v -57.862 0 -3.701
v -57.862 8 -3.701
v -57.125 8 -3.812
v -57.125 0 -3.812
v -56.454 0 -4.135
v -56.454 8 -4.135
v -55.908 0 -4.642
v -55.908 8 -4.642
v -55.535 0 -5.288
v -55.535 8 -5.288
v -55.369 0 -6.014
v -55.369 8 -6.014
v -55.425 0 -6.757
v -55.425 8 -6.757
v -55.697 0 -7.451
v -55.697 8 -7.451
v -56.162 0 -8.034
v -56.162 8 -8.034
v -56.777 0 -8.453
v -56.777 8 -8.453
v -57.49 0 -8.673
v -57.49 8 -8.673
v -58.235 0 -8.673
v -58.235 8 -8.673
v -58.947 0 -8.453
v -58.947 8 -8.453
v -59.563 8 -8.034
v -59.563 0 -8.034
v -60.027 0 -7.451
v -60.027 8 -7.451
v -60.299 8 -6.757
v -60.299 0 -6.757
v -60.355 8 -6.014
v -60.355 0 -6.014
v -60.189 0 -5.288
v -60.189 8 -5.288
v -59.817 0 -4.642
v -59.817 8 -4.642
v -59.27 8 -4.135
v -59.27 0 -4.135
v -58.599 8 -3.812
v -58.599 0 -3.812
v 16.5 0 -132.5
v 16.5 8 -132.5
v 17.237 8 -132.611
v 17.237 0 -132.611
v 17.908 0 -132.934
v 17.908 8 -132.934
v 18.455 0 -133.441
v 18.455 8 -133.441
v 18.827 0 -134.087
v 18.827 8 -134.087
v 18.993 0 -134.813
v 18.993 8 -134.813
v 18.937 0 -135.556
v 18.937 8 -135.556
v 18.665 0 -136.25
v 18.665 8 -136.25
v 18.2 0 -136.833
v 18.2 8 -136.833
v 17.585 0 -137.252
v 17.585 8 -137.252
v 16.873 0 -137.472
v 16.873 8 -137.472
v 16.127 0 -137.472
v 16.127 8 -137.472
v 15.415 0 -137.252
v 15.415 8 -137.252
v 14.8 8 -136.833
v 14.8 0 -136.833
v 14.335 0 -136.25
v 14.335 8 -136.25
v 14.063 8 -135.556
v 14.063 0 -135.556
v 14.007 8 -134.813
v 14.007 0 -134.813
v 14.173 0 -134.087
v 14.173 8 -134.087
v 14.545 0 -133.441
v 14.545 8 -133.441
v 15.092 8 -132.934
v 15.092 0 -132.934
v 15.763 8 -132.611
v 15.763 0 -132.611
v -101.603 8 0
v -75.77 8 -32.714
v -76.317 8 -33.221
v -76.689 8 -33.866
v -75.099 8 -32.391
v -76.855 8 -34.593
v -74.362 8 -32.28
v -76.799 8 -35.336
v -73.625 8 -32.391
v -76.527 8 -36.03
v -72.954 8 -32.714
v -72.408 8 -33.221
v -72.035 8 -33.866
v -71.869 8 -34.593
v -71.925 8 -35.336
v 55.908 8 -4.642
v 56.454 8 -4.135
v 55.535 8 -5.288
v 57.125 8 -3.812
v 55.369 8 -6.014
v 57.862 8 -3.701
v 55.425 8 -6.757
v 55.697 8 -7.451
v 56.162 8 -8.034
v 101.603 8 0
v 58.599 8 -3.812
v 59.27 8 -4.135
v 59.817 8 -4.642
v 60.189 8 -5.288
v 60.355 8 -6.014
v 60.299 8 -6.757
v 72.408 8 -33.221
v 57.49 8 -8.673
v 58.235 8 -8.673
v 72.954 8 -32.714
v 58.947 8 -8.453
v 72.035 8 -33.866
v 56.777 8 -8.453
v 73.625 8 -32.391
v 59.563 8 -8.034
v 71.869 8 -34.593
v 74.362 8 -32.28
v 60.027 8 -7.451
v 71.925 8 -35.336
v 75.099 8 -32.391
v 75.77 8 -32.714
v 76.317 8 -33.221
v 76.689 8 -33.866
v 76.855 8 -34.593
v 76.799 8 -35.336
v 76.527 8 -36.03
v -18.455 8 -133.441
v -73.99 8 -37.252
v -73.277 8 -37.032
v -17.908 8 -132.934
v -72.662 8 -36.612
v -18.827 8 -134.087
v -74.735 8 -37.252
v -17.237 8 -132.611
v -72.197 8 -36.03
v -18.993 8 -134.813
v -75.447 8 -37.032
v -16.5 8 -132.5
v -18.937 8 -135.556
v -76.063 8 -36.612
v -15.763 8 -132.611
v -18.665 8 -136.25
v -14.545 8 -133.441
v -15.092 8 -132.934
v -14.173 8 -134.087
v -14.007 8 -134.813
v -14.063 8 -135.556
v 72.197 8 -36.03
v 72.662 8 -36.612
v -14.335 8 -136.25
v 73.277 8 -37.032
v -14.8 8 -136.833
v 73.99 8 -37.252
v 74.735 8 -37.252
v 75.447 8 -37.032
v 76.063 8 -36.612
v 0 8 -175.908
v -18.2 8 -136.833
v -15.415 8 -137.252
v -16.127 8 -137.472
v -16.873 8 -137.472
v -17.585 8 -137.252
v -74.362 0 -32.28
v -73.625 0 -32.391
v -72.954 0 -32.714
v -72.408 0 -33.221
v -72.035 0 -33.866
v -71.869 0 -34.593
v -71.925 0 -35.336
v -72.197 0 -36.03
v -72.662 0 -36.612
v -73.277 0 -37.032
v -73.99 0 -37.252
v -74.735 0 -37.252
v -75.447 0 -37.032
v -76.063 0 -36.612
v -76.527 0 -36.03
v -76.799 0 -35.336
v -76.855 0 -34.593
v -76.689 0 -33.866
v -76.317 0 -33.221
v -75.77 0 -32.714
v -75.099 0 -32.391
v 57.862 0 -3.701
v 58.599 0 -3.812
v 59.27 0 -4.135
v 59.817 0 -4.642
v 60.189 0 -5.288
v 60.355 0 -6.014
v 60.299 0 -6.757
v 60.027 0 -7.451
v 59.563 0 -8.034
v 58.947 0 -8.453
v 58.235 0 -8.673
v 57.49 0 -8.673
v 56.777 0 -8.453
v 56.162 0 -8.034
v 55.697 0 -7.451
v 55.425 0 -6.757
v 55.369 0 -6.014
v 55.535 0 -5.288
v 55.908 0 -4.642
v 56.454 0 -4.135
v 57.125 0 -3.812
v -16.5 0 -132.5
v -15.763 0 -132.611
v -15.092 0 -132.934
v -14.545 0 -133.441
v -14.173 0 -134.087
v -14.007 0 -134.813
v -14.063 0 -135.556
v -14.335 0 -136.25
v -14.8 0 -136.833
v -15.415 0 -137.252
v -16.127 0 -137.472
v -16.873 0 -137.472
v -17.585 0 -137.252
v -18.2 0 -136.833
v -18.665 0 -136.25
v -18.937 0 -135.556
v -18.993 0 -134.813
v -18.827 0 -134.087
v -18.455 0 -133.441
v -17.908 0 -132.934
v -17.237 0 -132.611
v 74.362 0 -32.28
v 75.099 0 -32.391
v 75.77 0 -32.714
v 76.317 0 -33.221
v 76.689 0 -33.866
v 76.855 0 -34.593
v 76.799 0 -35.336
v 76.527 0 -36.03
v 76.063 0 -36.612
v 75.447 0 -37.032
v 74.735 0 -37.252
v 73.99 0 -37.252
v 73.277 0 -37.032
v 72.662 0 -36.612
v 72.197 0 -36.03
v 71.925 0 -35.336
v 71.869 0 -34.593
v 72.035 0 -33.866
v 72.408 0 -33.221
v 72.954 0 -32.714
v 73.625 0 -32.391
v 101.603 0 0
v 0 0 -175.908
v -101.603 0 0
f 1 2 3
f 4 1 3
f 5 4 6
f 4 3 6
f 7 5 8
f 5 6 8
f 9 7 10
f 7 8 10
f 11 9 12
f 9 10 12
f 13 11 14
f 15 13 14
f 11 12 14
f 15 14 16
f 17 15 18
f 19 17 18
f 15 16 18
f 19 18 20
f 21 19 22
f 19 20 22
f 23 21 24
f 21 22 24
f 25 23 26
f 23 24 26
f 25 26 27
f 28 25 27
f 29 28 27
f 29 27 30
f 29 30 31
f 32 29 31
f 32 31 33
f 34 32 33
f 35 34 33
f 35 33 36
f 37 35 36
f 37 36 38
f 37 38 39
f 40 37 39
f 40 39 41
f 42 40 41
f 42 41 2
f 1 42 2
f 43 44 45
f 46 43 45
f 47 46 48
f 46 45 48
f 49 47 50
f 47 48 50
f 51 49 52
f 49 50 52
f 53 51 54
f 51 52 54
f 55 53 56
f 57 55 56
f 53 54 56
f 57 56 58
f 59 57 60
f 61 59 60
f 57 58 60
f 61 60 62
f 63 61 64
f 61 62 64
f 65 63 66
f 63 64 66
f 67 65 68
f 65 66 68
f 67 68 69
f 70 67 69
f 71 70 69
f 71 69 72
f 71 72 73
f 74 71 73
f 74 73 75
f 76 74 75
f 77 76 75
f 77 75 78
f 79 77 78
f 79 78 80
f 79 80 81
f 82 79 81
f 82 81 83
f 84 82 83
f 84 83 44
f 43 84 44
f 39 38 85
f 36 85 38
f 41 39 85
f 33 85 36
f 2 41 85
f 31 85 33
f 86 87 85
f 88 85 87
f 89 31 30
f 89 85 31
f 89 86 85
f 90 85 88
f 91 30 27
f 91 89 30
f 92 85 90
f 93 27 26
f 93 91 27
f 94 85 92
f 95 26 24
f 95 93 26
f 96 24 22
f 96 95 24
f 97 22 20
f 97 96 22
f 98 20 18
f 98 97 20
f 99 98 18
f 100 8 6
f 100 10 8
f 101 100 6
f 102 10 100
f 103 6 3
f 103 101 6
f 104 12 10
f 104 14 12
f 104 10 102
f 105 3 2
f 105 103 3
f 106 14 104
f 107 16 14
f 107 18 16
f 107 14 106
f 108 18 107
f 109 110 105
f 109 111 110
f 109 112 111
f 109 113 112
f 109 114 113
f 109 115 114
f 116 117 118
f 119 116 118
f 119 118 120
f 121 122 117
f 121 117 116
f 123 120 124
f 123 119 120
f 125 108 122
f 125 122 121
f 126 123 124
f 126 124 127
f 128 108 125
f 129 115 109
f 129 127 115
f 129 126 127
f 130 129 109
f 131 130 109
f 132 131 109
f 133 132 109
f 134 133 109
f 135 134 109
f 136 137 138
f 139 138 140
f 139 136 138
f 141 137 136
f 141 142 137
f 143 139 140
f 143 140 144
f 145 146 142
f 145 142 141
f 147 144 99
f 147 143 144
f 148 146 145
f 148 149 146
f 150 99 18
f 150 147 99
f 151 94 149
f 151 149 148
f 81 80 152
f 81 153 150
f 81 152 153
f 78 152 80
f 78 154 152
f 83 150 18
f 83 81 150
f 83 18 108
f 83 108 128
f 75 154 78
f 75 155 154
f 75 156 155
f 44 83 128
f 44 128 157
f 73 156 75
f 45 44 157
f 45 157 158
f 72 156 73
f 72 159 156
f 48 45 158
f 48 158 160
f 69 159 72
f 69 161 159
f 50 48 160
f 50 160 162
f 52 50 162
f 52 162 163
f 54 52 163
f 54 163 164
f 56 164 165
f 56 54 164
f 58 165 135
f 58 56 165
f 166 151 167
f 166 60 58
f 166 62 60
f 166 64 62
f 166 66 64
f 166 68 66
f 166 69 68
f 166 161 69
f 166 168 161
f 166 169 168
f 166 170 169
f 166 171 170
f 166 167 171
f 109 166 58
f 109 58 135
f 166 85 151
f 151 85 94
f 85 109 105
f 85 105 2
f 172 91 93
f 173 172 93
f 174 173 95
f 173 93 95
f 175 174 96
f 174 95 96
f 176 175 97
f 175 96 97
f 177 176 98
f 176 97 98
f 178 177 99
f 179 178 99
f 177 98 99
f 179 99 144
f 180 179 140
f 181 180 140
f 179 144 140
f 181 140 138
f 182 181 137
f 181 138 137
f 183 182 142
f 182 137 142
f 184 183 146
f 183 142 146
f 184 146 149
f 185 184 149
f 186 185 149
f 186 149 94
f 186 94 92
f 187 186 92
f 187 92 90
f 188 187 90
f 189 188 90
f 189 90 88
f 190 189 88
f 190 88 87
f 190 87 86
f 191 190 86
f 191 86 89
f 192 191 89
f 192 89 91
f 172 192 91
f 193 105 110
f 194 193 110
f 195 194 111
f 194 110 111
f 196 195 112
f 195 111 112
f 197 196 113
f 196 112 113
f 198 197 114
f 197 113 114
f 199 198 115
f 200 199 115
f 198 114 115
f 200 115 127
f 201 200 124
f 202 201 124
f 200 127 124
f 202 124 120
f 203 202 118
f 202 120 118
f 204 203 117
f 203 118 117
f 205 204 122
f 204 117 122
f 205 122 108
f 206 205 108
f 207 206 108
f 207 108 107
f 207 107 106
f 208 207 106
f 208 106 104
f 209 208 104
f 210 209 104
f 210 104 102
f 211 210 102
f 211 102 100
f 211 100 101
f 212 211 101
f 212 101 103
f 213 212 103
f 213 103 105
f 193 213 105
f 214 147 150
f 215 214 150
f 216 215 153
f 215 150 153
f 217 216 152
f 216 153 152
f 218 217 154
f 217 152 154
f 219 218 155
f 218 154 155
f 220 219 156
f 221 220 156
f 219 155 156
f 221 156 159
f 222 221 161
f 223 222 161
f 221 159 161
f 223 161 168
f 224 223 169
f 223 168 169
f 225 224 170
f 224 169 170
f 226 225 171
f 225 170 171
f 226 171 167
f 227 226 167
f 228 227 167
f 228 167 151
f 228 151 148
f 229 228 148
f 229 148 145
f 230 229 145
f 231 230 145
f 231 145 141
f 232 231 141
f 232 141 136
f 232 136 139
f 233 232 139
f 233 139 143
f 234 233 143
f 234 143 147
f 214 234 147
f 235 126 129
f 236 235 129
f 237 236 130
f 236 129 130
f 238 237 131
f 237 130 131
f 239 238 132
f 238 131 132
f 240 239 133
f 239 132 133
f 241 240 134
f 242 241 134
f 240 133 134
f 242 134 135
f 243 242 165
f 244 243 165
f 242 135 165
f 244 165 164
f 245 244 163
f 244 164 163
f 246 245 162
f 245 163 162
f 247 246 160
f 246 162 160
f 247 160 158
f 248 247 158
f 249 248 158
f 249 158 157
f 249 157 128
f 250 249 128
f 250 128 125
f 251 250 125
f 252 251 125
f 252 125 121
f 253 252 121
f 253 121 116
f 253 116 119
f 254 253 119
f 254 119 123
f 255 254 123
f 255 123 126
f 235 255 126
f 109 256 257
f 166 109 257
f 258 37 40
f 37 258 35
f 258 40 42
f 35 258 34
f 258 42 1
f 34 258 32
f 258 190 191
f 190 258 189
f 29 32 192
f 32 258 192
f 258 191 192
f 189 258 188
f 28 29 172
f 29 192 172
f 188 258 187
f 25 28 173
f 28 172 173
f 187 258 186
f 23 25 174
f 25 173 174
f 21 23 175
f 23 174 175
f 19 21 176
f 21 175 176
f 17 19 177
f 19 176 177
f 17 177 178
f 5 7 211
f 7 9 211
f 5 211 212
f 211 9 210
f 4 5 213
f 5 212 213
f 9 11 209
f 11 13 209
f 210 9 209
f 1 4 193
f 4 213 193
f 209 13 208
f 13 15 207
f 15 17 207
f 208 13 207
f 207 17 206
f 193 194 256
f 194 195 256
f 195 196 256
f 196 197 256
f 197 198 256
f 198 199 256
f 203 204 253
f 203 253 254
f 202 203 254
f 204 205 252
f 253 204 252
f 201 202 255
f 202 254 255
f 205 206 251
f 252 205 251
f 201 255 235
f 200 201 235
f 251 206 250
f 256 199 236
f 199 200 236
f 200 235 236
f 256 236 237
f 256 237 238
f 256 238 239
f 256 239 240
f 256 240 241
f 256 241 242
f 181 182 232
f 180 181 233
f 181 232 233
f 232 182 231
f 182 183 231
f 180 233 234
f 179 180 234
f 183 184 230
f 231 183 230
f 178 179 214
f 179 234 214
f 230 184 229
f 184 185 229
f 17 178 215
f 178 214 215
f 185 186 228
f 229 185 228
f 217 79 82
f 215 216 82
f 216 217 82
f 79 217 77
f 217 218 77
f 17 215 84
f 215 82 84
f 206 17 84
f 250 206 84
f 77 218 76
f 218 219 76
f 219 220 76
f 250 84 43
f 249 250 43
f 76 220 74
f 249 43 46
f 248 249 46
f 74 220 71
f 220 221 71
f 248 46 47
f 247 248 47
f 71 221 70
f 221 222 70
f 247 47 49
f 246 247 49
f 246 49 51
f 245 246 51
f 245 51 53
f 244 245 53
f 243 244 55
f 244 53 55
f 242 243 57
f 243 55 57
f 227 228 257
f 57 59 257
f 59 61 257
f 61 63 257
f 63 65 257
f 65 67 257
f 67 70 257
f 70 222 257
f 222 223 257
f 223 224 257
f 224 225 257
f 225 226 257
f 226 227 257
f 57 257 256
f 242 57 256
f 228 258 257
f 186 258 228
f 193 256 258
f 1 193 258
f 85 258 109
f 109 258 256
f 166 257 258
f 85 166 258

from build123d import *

# Parameters (mm, degrees)
SALIENTE_EXTRUIR2_DEPTH = 8
CROQUIS3_R              = 2.5
CORTAR_EXTRUIR1_DEPTH   = 31


with BuildPart() as part:
    # Croquis1 → Saliente-Extruir2 (new body)
    with BuildSketch(Plane(origin=(0, 0, 0), x_dir=(1, 0, 0), z_dir=(0, 1, 0))):
        Polygon((101.602540378, 0), (0, 175.908017141), (-101.602540378, 0), align=None)
    extrude(amount=SALIENTE_EXTRUIR2_DEPTH)

    # Croquis3 → Cortar-Extruir1 (cut)
    with BuildSketch(Plane(origin=(0, 8, 0), x_dir=(1, 0, 0), z_dir=(0, 1, 0))):
        with Locations(Location((-16.5, 135, 0), (0, 0, 270))):
            Circle(CROQUIS3_R)
        with Locations(Location((16.5, 135, 0), (0, 0, 270))):
            Circle(CROQUIS3_R)
        with Locations(Location((-57.862159322, 6.200961894, 0), (0, 0, 270))):
            Circle(CROQUIS3_R)
        with Locations(Location((-74.362159322, 34.779800219, 0), (0, 0, 270))):
            Circle(CROQUIS3_R)
        with Locations(Location((57.862159322, 6.200961894, 0), (0, 0, 270))):
            Circle(CROQUIS3_R)
        with Locations(Location((74.362159322, 34.779800219, 0), (0, 0, 270))):
            Circle(CROQUIS3_R)
    extrude(amount=-CORTAR_EXTRUIR1_DEPTH, mode=Mode.SUBTRACT)


solid = part.part
